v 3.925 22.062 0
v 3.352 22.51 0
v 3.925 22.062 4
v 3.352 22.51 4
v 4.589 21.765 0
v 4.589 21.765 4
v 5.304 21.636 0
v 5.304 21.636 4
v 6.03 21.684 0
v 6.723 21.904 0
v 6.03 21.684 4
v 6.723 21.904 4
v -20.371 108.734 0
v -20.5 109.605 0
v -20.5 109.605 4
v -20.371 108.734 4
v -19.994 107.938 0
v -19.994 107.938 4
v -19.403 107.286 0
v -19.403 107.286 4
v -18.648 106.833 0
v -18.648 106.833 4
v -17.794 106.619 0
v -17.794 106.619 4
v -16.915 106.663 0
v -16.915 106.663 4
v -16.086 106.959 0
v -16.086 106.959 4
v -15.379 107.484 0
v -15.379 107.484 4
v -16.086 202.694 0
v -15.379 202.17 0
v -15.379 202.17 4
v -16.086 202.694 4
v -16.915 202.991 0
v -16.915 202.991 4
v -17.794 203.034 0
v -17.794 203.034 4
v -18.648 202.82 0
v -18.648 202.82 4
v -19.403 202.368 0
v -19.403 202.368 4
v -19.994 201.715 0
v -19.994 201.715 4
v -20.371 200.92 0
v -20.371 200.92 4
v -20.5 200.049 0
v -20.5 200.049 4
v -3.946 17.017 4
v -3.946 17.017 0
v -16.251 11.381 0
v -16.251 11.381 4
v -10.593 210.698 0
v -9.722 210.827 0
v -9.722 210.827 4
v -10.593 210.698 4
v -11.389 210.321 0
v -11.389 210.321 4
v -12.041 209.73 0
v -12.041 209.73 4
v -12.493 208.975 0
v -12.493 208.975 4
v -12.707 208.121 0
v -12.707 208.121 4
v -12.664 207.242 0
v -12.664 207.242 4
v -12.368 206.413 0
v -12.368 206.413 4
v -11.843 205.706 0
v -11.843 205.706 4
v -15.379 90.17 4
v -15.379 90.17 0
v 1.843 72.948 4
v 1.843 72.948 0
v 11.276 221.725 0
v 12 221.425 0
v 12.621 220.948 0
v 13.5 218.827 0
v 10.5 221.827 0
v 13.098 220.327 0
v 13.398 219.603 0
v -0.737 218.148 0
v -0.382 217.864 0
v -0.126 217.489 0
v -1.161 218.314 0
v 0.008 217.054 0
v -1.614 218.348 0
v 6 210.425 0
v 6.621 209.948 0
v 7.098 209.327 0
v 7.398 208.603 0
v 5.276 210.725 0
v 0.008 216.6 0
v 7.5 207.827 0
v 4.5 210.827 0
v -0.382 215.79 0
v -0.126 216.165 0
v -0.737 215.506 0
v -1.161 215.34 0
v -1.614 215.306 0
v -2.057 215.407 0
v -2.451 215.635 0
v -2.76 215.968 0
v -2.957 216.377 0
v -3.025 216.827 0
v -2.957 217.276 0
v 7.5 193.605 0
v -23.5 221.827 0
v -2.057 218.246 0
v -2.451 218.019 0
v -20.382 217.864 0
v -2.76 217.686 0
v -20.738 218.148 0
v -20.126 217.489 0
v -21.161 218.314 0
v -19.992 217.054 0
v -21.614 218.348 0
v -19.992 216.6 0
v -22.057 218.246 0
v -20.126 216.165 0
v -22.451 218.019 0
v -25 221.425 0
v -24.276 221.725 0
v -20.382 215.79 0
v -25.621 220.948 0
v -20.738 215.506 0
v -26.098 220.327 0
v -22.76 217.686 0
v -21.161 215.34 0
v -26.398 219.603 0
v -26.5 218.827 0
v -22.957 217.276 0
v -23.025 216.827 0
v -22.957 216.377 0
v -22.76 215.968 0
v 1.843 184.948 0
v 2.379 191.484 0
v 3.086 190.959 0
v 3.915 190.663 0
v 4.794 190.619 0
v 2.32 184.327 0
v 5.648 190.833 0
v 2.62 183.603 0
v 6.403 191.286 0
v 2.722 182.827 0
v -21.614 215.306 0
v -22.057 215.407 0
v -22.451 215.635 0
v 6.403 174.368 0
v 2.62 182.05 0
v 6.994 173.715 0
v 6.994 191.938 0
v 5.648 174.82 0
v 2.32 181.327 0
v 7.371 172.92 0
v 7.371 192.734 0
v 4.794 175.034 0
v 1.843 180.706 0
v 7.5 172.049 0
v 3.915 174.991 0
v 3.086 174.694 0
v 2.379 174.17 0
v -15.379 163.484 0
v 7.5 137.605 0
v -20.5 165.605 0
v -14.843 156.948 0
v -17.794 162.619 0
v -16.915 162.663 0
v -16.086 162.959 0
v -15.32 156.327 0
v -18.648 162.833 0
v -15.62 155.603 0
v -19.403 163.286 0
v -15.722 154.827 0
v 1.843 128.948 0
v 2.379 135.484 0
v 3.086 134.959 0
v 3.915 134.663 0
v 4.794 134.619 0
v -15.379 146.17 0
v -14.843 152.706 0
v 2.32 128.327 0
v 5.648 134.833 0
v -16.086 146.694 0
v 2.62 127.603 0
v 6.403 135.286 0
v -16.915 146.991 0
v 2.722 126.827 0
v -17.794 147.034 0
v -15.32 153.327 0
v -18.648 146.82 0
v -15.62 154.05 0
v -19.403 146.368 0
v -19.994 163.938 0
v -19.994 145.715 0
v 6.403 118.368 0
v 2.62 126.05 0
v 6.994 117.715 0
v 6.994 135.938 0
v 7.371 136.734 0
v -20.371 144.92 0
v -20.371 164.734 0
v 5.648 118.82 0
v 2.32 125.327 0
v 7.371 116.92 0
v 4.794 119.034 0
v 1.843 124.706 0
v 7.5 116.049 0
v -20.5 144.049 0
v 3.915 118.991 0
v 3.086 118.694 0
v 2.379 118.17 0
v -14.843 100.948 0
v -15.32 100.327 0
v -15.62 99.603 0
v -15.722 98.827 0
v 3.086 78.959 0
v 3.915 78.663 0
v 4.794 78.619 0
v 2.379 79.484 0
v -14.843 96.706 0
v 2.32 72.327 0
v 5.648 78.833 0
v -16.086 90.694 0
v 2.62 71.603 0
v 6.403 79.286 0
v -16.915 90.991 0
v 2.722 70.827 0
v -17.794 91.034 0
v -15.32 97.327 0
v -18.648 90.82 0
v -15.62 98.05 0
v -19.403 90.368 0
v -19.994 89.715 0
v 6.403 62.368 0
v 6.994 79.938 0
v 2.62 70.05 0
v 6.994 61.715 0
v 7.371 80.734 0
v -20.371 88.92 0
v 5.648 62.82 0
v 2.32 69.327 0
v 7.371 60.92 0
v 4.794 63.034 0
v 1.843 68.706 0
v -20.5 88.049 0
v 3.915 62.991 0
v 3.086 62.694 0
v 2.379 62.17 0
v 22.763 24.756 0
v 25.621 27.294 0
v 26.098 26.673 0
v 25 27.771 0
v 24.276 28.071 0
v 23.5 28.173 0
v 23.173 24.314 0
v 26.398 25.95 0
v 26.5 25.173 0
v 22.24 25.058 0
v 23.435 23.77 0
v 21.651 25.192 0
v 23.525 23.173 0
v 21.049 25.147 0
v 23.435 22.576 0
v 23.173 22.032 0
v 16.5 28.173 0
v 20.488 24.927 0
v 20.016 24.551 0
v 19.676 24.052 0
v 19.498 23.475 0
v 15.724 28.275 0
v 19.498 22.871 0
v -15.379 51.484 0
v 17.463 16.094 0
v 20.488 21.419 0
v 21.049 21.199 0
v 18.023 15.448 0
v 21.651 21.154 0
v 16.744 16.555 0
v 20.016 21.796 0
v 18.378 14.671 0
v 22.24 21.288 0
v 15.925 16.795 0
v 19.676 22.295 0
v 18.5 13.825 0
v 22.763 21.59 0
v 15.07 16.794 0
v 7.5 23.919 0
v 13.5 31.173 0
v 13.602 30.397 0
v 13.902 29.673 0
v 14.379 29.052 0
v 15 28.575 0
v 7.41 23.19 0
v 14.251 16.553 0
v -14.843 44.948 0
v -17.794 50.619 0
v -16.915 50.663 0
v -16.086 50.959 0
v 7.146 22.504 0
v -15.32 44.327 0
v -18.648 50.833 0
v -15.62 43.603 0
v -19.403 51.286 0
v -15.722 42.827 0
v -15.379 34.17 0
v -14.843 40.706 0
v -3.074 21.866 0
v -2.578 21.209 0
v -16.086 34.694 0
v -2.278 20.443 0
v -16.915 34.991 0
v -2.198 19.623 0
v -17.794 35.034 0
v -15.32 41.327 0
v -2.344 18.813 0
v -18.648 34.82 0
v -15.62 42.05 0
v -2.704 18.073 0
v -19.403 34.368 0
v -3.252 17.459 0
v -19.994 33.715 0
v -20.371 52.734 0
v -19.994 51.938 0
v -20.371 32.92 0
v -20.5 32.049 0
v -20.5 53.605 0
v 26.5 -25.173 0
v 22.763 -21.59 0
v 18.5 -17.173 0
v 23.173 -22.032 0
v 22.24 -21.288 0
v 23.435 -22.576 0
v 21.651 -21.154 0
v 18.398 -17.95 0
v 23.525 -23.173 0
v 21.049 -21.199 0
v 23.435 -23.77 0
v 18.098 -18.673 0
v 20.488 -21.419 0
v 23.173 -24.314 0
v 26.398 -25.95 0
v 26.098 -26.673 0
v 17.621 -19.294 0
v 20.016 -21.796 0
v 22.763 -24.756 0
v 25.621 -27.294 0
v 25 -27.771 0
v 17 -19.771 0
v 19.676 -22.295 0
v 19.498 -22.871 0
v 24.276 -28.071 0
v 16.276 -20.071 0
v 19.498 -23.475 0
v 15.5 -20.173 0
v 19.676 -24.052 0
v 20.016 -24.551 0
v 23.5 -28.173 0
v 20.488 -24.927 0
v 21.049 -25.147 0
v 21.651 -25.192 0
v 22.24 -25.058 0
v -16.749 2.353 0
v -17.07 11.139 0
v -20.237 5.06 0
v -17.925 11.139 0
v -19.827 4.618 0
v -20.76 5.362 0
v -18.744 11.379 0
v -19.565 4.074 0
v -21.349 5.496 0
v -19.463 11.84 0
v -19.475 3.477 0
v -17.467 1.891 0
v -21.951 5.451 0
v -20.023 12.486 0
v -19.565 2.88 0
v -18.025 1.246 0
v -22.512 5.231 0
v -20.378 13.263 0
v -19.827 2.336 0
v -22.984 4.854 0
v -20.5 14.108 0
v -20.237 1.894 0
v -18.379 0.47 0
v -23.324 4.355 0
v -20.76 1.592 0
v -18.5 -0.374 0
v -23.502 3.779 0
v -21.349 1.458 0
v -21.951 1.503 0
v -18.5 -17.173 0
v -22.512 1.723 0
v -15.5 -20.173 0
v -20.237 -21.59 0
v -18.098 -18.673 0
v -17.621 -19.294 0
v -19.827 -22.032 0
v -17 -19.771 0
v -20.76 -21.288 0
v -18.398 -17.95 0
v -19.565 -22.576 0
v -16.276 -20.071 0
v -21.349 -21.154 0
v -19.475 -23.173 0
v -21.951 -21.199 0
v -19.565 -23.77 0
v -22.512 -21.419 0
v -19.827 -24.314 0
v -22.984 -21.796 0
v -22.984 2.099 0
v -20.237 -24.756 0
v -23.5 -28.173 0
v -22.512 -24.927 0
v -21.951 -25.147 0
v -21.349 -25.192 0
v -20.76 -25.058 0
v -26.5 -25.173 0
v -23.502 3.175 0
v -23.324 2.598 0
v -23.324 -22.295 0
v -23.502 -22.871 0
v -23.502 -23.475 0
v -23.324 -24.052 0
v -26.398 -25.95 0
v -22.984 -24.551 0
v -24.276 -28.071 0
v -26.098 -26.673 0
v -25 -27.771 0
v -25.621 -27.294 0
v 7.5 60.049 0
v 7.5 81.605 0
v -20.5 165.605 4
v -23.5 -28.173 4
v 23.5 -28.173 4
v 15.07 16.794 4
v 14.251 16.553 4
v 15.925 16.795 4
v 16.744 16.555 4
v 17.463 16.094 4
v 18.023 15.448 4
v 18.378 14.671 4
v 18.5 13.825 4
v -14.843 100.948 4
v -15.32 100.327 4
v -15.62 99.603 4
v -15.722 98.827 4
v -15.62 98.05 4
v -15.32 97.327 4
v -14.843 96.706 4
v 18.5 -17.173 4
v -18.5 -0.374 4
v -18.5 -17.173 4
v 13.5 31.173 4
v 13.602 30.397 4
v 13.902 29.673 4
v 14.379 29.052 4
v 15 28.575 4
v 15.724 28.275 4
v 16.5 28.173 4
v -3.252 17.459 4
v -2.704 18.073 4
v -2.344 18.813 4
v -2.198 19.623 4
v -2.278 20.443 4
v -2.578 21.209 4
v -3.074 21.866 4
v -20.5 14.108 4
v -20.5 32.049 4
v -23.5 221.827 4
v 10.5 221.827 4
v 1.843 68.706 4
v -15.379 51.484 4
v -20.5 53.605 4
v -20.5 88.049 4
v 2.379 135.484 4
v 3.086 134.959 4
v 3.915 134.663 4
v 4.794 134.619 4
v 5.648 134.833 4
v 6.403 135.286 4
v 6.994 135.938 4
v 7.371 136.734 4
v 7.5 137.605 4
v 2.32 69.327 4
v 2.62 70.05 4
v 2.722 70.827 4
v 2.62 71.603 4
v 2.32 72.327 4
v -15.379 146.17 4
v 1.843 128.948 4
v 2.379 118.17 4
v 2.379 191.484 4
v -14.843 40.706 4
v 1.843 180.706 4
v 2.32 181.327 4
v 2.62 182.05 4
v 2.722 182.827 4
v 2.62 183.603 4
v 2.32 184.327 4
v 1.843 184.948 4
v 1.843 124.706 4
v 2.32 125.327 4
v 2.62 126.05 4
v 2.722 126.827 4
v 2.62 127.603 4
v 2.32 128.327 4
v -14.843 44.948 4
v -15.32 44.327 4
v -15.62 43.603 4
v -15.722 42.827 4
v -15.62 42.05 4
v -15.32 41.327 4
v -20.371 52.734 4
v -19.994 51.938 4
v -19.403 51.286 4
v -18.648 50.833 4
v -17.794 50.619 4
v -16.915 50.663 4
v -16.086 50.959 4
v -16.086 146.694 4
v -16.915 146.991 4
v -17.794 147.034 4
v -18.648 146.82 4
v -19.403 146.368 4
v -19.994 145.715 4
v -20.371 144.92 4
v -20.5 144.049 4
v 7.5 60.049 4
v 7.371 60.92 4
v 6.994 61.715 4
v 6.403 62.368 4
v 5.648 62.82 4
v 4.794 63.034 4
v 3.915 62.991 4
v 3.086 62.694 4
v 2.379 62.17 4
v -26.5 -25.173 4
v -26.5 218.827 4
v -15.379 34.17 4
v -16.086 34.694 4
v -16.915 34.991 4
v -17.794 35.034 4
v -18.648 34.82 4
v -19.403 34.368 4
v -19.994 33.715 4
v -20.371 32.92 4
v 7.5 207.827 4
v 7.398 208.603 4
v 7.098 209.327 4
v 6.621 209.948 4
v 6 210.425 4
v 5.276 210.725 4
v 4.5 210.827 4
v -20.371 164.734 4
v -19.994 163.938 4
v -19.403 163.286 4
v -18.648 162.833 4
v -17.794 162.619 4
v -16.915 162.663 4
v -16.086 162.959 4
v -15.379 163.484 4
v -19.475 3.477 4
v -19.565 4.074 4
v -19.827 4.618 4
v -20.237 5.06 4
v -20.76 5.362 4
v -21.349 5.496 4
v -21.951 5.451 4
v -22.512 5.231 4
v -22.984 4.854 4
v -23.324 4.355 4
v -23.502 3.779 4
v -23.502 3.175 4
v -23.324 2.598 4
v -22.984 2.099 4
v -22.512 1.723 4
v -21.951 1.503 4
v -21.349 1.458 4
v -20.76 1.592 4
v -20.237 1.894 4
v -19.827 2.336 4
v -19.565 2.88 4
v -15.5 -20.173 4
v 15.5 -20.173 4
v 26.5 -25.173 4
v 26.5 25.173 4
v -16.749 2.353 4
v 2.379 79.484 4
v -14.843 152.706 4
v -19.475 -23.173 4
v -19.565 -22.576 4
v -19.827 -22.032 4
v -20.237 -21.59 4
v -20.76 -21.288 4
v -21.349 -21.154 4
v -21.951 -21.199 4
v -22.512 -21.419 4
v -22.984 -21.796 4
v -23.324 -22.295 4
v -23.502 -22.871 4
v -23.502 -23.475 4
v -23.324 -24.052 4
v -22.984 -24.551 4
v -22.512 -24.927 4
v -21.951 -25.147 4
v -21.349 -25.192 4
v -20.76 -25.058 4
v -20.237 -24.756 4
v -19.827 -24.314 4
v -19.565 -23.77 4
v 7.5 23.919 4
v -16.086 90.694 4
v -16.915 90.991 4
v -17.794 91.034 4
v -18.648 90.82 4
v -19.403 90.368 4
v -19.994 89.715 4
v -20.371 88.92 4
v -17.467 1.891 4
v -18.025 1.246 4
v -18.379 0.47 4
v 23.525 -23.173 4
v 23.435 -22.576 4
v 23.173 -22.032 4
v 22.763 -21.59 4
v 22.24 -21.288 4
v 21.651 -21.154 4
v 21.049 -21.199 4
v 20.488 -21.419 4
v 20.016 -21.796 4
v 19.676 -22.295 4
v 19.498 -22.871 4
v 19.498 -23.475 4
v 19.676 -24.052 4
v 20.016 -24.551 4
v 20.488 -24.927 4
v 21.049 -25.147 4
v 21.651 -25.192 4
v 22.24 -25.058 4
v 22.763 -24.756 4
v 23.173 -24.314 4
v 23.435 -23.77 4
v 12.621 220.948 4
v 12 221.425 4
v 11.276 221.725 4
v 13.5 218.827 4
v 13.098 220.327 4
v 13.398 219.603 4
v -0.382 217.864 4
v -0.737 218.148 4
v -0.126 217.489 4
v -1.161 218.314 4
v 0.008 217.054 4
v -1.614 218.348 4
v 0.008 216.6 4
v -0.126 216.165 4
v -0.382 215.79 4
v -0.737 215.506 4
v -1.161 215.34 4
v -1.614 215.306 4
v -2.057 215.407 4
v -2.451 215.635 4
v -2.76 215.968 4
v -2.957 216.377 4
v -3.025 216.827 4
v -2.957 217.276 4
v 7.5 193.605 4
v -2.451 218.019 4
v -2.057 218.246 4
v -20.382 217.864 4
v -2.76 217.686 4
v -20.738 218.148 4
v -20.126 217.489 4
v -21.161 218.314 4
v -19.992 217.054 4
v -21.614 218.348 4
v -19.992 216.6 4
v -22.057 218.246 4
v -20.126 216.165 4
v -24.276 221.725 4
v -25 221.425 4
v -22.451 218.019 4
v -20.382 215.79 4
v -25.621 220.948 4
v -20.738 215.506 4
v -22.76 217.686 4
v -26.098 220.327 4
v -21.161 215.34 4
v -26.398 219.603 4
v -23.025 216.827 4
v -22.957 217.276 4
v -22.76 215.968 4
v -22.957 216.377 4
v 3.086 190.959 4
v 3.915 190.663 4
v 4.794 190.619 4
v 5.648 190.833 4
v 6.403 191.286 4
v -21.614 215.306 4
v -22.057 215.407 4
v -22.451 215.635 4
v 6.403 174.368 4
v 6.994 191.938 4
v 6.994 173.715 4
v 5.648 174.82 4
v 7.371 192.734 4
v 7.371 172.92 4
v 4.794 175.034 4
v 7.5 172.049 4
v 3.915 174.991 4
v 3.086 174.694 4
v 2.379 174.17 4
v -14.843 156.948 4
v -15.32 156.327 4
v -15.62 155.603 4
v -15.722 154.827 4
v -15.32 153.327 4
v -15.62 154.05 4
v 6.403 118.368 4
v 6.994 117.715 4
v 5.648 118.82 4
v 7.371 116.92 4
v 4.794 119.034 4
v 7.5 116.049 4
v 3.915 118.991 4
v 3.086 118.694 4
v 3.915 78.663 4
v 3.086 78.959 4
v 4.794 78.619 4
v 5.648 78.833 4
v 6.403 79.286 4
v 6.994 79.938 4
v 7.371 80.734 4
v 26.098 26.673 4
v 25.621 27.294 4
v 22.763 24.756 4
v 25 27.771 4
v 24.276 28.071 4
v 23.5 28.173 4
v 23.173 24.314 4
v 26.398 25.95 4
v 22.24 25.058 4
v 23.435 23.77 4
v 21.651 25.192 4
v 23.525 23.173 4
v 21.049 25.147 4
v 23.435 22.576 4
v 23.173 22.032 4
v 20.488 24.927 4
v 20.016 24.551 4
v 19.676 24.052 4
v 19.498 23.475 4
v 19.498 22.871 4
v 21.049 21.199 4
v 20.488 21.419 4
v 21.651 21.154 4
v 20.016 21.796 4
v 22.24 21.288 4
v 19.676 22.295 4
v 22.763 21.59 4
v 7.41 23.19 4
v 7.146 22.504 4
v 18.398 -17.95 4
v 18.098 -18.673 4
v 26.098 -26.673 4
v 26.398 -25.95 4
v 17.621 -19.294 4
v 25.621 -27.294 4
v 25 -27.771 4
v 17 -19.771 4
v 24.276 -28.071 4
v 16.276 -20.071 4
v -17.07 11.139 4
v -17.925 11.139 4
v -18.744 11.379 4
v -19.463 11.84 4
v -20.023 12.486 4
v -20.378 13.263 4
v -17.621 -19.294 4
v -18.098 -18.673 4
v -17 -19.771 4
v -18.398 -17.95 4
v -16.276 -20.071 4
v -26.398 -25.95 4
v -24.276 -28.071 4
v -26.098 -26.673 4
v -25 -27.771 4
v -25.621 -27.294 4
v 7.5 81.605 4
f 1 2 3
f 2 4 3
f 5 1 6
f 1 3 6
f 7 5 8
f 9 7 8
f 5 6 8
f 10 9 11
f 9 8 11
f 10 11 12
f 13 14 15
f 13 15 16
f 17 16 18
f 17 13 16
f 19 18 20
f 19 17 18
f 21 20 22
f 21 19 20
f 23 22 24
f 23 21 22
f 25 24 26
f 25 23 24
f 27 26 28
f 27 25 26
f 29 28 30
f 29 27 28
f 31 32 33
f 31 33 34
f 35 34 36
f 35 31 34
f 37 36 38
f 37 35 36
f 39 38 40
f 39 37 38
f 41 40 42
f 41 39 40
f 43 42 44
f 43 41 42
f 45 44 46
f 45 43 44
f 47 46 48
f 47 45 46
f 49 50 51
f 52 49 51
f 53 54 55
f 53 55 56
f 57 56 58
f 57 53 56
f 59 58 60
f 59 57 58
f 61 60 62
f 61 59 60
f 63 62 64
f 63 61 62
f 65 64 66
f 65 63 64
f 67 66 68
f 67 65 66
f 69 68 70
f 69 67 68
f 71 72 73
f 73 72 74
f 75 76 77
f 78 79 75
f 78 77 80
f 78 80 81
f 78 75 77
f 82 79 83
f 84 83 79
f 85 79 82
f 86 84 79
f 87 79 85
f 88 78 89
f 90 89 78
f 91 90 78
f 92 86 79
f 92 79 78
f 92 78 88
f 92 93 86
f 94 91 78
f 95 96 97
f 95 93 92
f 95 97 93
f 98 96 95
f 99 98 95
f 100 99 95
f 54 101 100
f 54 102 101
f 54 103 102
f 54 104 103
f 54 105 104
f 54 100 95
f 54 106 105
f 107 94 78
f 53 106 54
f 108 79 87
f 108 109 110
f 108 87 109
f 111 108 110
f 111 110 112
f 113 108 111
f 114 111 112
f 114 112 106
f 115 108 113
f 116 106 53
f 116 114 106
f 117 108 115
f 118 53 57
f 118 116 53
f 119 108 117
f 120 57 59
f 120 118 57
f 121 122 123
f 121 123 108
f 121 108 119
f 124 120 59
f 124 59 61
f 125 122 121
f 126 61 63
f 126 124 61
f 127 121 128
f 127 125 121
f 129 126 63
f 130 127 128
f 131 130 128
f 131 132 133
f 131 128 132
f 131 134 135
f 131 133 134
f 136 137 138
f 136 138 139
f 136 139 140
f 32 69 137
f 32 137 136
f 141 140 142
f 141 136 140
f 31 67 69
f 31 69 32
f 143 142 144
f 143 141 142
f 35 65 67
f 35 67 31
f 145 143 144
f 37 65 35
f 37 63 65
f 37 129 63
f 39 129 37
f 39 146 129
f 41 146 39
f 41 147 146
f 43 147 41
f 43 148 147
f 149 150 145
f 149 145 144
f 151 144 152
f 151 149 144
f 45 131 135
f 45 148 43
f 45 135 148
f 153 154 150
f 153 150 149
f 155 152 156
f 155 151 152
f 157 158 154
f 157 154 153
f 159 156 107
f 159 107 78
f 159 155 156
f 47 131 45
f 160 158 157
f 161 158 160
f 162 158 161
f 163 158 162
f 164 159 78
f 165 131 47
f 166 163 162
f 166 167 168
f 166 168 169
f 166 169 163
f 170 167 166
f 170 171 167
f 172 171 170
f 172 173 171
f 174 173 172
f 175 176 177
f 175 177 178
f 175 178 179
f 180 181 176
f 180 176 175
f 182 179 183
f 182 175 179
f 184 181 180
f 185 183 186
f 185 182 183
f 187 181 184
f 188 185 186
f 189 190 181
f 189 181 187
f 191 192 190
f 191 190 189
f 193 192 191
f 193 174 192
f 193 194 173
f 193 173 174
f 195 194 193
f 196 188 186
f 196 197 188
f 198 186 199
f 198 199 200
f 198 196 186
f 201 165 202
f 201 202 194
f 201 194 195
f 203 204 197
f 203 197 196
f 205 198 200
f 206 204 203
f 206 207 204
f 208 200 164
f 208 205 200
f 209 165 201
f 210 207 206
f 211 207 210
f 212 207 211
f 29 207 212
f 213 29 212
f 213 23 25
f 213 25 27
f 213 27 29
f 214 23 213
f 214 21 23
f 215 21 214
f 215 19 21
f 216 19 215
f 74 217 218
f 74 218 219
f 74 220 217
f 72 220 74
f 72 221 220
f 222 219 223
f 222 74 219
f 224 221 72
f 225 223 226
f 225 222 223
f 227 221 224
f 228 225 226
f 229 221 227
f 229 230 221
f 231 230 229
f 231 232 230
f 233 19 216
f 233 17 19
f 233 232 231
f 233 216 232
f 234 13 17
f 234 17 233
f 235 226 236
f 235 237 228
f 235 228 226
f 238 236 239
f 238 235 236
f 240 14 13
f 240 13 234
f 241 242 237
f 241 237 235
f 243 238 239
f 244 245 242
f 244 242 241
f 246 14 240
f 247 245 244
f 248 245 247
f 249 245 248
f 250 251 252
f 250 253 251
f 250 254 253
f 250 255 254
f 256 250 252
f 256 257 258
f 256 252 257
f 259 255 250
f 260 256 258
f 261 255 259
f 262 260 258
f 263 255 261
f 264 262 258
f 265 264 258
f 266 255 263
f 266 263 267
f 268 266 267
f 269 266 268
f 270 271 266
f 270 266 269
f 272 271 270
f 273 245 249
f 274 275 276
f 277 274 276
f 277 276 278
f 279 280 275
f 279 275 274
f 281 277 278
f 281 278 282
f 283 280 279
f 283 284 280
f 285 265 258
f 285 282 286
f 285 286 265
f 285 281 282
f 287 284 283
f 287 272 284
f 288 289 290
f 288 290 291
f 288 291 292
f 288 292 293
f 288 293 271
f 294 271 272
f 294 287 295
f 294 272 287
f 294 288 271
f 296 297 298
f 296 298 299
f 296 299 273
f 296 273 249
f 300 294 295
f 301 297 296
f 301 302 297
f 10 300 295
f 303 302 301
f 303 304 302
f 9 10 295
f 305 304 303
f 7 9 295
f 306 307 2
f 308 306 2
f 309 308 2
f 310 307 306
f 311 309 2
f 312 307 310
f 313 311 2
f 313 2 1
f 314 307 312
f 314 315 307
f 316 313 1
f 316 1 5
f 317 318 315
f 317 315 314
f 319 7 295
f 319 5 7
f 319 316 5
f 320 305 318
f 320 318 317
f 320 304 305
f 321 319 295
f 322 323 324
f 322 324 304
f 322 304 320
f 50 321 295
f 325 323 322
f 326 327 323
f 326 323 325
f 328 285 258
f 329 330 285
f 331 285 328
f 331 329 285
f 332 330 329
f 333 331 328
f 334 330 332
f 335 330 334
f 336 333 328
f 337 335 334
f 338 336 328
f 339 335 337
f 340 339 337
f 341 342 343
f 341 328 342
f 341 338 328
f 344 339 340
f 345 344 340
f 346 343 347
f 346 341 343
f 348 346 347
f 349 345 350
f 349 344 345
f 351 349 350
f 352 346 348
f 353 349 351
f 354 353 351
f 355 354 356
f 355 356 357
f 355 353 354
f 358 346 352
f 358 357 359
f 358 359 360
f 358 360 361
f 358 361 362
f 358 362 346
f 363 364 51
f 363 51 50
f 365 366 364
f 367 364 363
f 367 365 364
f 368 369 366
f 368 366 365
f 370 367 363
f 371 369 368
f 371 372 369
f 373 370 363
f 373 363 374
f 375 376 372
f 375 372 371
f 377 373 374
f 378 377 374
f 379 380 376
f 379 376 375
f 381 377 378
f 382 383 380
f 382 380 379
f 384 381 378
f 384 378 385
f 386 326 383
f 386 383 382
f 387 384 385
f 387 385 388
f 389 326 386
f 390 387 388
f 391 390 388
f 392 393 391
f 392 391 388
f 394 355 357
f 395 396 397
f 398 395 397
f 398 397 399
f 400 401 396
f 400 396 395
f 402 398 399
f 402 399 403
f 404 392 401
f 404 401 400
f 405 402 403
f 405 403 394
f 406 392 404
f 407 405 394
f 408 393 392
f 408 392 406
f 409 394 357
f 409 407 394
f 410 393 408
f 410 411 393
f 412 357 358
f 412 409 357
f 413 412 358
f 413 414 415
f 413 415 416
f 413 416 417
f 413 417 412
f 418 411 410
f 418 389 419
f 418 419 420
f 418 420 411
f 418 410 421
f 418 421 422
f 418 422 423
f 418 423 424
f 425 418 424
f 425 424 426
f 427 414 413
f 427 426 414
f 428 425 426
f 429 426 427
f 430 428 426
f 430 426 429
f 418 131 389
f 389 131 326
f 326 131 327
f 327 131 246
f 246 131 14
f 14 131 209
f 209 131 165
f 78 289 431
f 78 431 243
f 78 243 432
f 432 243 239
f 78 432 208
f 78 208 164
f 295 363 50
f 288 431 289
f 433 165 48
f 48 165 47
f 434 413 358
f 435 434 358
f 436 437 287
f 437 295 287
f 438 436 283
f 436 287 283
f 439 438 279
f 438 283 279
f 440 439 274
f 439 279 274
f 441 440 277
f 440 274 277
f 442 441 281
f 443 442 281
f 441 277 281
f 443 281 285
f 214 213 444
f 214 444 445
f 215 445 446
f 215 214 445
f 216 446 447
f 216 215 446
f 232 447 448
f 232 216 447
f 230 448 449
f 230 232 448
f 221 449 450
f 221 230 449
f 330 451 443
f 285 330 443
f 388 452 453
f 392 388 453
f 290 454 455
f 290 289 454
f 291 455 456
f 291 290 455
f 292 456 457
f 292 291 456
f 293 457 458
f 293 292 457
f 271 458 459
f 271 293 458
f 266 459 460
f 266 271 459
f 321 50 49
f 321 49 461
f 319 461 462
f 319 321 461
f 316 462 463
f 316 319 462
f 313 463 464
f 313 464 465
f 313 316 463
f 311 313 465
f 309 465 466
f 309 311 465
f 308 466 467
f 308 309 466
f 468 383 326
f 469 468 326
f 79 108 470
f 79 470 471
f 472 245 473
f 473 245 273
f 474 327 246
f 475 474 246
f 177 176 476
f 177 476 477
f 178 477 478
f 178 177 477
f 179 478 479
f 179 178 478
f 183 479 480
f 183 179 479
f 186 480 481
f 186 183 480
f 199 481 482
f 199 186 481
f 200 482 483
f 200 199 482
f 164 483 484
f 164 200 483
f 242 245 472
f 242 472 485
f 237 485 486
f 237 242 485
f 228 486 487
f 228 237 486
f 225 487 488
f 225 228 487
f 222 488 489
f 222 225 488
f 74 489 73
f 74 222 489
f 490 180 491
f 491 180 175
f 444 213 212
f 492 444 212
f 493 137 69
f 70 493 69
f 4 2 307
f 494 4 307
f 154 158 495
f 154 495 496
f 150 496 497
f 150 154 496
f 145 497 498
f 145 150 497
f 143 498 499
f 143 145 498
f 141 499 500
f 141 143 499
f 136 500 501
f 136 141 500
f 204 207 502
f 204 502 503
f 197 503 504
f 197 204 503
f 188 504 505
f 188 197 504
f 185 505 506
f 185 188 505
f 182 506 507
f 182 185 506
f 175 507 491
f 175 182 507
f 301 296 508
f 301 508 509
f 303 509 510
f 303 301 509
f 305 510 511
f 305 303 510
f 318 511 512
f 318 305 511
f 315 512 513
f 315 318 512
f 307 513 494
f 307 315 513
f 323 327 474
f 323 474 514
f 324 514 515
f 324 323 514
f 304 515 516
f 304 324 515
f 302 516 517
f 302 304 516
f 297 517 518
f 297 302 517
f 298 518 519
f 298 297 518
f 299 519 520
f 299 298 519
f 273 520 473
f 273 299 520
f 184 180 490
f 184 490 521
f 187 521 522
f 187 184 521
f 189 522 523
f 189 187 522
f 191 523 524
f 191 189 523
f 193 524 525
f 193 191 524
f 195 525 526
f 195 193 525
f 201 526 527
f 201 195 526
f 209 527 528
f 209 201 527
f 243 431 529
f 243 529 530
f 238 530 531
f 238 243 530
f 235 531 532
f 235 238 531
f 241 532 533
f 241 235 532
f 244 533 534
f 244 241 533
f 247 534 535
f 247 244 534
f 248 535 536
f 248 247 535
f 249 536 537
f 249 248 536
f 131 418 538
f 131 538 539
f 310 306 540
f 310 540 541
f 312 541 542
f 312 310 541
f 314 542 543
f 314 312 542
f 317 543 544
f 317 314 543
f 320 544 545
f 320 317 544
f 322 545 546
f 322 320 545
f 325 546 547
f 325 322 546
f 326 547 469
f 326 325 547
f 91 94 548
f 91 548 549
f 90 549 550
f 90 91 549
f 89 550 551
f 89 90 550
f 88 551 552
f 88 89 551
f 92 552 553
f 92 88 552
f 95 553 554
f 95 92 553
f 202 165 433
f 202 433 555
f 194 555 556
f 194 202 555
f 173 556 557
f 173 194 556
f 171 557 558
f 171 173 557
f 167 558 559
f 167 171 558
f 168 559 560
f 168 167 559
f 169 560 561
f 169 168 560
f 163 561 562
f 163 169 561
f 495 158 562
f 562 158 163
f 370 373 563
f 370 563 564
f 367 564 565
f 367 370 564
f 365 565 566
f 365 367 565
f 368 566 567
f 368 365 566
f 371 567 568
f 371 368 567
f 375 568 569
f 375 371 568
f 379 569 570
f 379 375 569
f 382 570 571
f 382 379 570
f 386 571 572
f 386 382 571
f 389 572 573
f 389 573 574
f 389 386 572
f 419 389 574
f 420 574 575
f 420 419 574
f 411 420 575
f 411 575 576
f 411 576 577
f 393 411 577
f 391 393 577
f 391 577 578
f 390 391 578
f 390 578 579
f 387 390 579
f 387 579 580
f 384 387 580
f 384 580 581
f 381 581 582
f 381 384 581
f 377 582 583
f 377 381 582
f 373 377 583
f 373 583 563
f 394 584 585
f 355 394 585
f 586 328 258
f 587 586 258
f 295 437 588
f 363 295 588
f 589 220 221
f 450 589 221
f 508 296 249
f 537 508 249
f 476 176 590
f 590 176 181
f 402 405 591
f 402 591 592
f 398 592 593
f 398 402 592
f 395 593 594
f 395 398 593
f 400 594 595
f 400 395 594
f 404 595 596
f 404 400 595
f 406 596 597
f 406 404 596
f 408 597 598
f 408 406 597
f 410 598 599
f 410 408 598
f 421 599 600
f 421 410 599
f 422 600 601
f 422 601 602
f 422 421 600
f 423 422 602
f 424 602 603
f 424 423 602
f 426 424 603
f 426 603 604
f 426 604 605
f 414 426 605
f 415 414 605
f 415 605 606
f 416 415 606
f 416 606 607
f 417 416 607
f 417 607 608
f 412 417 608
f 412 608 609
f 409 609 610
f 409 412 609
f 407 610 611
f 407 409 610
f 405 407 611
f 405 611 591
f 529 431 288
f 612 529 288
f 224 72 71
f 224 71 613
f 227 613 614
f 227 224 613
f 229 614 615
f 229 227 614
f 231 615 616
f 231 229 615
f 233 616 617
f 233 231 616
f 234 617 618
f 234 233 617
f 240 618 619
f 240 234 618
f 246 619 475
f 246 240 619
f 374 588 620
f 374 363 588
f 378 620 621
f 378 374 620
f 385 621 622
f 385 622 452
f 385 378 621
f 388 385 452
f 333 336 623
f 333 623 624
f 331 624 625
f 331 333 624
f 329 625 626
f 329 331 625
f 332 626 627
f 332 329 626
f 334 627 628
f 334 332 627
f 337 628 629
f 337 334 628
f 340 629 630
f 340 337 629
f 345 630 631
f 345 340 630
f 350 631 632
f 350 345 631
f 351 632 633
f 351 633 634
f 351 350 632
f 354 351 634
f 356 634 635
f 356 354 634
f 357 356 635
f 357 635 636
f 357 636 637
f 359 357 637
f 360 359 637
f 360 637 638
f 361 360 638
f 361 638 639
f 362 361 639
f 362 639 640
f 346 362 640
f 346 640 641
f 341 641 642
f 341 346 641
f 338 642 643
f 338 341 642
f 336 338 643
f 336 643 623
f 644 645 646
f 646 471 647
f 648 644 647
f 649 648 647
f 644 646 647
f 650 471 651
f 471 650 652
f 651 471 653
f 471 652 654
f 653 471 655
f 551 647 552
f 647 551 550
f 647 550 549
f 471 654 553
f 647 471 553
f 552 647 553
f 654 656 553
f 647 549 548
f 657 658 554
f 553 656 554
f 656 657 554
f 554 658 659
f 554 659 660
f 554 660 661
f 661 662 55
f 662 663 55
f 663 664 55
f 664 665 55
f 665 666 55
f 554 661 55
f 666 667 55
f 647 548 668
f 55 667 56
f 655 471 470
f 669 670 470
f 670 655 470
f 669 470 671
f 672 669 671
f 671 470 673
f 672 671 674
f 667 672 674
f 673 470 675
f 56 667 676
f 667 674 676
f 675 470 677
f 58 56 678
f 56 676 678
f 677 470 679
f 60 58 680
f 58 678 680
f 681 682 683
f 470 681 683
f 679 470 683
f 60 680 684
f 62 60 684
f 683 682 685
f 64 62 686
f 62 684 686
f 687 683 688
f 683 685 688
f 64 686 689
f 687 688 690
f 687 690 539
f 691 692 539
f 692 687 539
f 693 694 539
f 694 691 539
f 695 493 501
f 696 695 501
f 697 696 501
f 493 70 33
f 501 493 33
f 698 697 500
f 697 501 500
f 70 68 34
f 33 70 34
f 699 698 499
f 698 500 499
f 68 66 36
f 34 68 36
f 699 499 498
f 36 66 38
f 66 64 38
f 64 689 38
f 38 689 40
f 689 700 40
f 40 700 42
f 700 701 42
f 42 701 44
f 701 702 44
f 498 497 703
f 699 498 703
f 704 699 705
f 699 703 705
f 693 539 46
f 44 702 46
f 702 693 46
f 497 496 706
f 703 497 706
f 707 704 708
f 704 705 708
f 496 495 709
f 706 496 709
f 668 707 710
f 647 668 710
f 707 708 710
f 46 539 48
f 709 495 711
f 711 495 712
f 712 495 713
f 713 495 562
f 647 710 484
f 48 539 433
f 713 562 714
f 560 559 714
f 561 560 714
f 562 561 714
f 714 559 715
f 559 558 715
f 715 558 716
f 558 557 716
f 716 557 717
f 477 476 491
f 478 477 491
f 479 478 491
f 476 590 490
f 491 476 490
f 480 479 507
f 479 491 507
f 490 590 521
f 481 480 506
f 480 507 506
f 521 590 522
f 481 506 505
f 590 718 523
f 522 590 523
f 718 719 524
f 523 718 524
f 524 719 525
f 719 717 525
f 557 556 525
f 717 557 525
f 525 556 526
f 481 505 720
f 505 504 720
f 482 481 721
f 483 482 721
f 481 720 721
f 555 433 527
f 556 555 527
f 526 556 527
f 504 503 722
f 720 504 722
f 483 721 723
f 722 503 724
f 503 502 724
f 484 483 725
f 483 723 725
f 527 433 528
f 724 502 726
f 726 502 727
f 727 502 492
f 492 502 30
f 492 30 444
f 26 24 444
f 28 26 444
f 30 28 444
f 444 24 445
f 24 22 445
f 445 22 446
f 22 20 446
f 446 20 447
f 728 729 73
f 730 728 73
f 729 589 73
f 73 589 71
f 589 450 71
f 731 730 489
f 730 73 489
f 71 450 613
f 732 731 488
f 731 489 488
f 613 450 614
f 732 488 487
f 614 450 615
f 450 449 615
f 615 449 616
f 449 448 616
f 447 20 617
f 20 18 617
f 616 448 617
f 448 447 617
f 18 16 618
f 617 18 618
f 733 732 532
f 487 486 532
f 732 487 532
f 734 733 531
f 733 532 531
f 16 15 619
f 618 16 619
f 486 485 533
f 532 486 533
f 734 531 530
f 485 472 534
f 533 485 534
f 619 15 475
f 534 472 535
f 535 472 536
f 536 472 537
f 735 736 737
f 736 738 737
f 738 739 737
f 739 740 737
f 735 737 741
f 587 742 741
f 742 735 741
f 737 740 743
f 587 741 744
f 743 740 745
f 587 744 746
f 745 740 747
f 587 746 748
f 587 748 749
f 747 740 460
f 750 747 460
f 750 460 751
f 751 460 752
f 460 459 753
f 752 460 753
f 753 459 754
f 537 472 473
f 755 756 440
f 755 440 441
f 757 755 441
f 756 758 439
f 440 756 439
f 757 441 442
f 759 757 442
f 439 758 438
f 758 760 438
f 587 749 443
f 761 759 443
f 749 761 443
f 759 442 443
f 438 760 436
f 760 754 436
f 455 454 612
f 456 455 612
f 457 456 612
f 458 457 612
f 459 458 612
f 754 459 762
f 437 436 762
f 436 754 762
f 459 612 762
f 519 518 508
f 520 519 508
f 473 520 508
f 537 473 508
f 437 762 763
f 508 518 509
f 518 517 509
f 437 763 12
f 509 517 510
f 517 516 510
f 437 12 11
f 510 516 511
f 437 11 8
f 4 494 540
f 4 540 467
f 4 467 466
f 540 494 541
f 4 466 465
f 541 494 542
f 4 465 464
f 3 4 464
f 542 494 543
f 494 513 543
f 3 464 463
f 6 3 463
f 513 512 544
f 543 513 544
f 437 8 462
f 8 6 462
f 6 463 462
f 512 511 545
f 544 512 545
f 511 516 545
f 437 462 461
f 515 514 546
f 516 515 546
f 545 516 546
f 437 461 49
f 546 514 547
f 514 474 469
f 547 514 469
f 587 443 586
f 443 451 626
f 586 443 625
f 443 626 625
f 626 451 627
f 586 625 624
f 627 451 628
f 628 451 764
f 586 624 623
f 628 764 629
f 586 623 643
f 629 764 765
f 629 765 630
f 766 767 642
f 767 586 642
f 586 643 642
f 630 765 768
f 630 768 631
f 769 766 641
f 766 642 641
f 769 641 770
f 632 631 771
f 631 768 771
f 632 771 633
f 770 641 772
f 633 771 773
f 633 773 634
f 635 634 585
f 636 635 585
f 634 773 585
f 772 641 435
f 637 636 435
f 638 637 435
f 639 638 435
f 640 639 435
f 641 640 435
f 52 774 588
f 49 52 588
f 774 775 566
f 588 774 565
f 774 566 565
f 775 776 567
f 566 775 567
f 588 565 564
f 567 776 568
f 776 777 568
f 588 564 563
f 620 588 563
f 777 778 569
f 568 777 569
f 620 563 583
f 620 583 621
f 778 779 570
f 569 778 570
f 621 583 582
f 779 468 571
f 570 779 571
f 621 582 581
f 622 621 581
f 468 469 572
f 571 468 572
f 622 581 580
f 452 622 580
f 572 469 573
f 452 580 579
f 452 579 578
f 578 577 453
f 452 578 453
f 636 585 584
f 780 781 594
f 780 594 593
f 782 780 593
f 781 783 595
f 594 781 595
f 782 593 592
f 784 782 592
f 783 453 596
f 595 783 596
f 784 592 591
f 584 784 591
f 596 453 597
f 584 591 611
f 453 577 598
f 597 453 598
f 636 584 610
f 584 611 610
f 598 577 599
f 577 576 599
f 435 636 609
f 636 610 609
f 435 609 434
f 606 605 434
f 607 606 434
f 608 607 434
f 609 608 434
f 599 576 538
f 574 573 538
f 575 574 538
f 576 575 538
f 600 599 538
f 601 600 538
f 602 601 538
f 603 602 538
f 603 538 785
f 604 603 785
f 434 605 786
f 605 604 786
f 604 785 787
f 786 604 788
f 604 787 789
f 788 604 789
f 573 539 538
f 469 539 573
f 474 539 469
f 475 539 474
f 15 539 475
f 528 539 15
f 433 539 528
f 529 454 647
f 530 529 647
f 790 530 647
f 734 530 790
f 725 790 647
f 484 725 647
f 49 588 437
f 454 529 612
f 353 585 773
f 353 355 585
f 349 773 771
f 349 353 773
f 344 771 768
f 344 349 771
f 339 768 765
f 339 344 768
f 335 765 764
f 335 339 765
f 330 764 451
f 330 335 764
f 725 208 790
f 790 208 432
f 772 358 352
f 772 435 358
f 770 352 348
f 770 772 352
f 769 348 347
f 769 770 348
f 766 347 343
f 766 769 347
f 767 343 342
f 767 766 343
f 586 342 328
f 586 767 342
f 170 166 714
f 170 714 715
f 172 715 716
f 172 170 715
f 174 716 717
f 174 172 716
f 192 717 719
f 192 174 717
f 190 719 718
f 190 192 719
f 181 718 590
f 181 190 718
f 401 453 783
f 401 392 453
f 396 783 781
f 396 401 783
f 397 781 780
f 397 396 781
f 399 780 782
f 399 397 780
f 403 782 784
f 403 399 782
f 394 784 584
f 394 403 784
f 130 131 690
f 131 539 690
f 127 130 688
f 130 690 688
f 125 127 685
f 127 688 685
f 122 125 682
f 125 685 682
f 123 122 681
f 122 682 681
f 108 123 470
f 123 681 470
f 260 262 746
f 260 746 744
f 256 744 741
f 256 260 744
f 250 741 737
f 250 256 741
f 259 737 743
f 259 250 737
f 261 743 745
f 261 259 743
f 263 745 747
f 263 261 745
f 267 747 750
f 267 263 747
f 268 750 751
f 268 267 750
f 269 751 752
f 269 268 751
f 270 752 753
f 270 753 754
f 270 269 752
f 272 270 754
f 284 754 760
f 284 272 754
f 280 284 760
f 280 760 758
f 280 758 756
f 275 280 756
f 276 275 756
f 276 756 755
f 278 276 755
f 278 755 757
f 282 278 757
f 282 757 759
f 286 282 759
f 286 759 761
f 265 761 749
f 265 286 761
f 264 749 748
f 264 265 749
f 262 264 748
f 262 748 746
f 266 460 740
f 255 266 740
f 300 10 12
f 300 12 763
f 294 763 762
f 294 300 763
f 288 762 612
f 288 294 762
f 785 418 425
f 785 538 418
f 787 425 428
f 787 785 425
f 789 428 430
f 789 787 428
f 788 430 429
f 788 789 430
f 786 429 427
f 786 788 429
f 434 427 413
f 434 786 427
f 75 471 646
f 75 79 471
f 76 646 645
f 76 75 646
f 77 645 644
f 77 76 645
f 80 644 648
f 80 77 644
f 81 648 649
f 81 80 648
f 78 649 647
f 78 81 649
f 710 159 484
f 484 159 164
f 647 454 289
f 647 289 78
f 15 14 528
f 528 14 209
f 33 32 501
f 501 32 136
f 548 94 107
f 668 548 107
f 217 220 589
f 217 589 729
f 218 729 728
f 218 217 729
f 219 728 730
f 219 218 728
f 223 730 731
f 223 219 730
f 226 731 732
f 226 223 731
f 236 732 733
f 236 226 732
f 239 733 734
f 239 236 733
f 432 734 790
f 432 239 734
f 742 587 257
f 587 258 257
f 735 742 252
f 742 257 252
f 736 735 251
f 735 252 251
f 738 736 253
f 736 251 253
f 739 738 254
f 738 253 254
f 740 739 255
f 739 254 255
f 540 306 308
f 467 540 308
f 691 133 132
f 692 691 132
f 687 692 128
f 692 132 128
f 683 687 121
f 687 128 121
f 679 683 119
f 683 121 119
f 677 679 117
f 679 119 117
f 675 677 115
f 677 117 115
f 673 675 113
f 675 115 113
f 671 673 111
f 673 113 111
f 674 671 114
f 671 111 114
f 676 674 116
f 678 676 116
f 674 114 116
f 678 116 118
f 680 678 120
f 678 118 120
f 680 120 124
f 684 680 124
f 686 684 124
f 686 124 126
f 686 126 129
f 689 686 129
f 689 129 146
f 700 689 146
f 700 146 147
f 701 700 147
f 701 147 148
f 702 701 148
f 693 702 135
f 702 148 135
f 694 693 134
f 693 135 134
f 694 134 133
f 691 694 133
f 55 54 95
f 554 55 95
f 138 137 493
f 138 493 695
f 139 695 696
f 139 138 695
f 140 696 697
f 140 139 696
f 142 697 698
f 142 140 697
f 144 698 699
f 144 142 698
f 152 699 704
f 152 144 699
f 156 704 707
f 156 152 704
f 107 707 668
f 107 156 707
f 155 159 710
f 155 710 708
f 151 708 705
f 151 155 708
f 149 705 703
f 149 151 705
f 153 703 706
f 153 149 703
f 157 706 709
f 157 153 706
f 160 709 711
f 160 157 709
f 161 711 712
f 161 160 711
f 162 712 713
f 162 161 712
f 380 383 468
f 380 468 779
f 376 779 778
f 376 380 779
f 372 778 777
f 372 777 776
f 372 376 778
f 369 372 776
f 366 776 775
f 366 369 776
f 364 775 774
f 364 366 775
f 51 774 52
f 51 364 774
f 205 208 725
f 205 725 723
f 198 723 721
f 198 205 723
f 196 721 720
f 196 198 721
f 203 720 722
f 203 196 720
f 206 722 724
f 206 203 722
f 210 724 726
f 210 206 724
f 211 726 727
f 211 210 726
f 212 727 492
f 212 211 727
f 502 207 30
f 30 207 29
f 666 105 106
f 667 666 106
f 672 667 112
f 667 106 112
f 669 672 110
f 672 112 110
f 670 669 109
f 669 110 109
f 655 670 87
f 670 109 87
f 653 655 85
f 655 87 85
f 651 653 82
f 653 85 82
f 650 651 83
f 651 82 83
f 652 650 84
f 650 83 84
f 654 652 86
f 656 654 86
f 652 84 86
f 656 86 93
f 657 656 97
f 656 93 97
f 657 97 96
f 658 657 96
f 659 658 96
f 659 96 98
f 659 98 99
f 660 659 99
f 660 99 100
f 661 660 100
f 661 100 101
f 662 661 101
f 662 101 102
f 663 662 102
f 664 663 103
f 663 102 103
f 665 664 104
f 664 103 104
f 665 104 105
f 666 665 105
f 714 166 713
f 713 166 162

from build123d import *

# Parameters (mm, degrees)
SKETCH_1_W          = 53
SKETCH_1_H          = 250
SKETCH_1_R          = 2.025
EXTRUDE_1_DEPTH     = 4
SKETCH_2_W          = 13
SKETCH_2_H          = 193.6536947
CUT_EXTRUDE_1_DEPTH = 4
SKETCH_6_R          = 1.525
CUT_EXTRUDE_3_DEPTH = 4
FILLET_1_R          = 3
CUT_EXTRUDE_4_DEPTH = 4
FILLET_2_R          = 3
CUT_EXTRUDE_5_DEPTH = 4
FILLET_3_R          = 3
FILLET_4_R          = 3


with BuildPart() as part:
    # 草图1 → 凸台-拉伸1 (new body)
    with BuildSketch(Plane.XY):
        with Locations((0, 96.82684735)):
            Rectangle(SKETCH_1_W, SKETCH_1_H)
        with Locations((21.5, 23.17315265)):
            Circle(SKETCH_1_R, mode=Mode.SUBTRACT)
        with Locations((21.5, -23.17315265)):
            Circle(SKETCH_1_R, mode=Mode.SUBTRACT)
        with Locations((-21.5, -23.17315265)):
            Circle(SKETCH_1_R, mode=Mode.SUBTRACT)
        with Locations((-21.5, 3.47684735)):
            Circle(SKETCH_1_R, mode=Mode.SUBTRACT)
    extrude(amount=EXTRUDE_1_DEPTH)

    # 草图2 → 切除-拉伸1 (cut)
    with BuildSketch(Plane.XY.offset(4)):
        with Locations((20, 125)):
            Rectangle(SKETCH_2_W, SKETCH_2_H)
    extrude(amount=-CUT_EXTRUDE_1_DEPTH, mode=Mode.SUBTRACT)

    # 草图6 → 切除-拉伸3 (cut)
    with BuildSketch(Plane(origin=(0, 0, 0), x_dir=(-1, 0, 0), z_dir=(0, 0, -1))):
        with Locations((21.5, 216.82684735)):
            Circle(SKETCH_6_R)
        with Locations((1.5, 216.82684735)):
            Circle(SKETCH_6_R)
    extrude(amount=-CUT_EXTRUDE_3_DEPTH, mode=Mode.SUBTRACT)

    # 圆角1
    fillet_1_edges = [part.edges().sort_by_distance(p)[0] for p in [
        (13.5, 221.82684735, 2),
        (26.5, 28.17315265, 2),
        (13.5, 28.17315265, 2),
        (-26.5, 221.82684735, 2),
        (26.5, -28.17315265, 2),
        (-26.5, -28.17315265, 2),
    ]]
    fillet(fillet_1_edges, radius=FILLET_1_R)

    # 草图7 → 切除-拉伸4 (cut)
    with BuildSketch(Plane.XY.offset(4)):
        Polygon((18.5, 18.499246673), (-18.5, 1.551263043), (-18.5, -20.17315265), (18.5, -20.17315265), align=None)
    extrude(amount=-CUT_EXTRUDE_4_DEPTH, mode=Mode.SUBTRACT)

    # 圆角2
    fillet_2_edges = [part.edges().sort_by_distance(p)[0] for p in [
        (18.5, 18.499246673, 2),
        (18.5, -20.17315265, 2),
        (-18.5, -20.17315265, 2),
        (-18.5, 1.551263043, 2),
    ]]
    fillet(fillet_2_edges, radius=FILLET_2_R)

    # 草图8 → 切除-拉伸5 (cut)
    with BuildSketch(Plane(origin=(0, 0, 0), x_dir=(-1, 0, 0), z_dir=(0, 0, -1))):
        Polygon((20.5, 39.291313444), (0.022812462, 18.814125906), (20.5, 9.434476198), align=None)
        Polygon((16.964466094, 42.82684735), (-7.5, 67.291313444), (-7.5, 22.259977323), (-4.826849962, 21.035531294), align=None)
        Polygon((20.5, 46.362381256), (20.5, 95.291313444), (-3.964466094, 70.82684735), align=None)
        Polygon((16.964466094, 98.82684735), (-7.5, 123.291313444), (-7.5, 74.362381256), align=None)
        Polygon((20.5, 102.362381256), (20.5, 151.291313444), (-3.964466094, 126.82684735), align=None)
        Polygon((16.964466094, 154.82684735), (-7.5, 179.291313444), (-7.5, 130.362381256), align=None)
        Polygon((20.5, 158.362381256), (20.5, 207.291313444), (-3.964466094, 182.82684735), align=None)
        Polygon((16.964466094, 210.82684735), (-7.5, 210.82684735), (-7.5, 186.362381256), align=None)
    extrude(amount=-CUT_EXTRUDE_5_DEPTH, mode=Mode.SUBTRACT)

    # 圆角3
    fillet_3_edges = [part.edges().sort_by_distance(p)[0] for p in [
        (4.826849962, 21.035531294, 2),
    ]]
    fillet(fillet_3_edges, radius=FILLET_3_R)

    # 圆角4
    # the kernel refuses this fillet: 3 mm, written as the material it adds along each edge
    with BuildSketch(Plane(origin=(-16.964466094, 98.82684735, 0), x_dir=(0.707106781186547, 0.7071067811865482, 0), z_dir=(0, 0, 1)), Plane(origin=(3.964466094, 126.82684735, 0), x_dir=(-0.7071067811865479, -0.707106781186547, 0), z_dir=(0, 0, 1)), Plane(origin=(7.5, 210.82684735, 0), x_dir=(0, -1, 0), z_dir=(0, 0, 1)), Plane(origin=(-16.964466094, 154.82684735, 0), x_dir=(0.7071067811865442, 0.7071067811865508, 0), z_dir=(0, 0, 1)), Plane(origin=(3.964466094, 182.82684735, 0), x_dir=(-0.7071067811865441, -0.7071067811865508, 0), z_dir=(0, 0, 1))) as fillet_4_piece_1:
        with BuildLine():
            CenterArc((FILLET_4_R, -FILLET_4_R), FILLET_4_R, 90, 90)
            Line((0, -FILLET_4_R), (-FILLET_4_R * 0.02, -FILLET_4_R))
            Line((-FILLET_4_R * 0.02, -FILLET_4_R), (-FILLET_4_R * 0.02, FILLET_4_R * 0.02))
            Line((-FILLET_4_R * 0.02, FILLET_4_R * 0.02), (FILLET_4_R, FILLET_4_R * 0.02))
            Line((FILLET_4_R, FILLET_4_R * 0.02), (FILLET_4_R, 0))
        make_face()
    extrude(amount=4)
    with BuildSketch(Plane(origin=(7.5, 74.362381256, 0), x_dir=(0, 1, 0), z_dir=(0, 0, 1)), Plane(origin=(-20.5, 102.362381256, 0), x_dir=(0.7071067811865476, 0.7071067811865476, 0), z_dir=(0, 0, 1)), Plane(origin=(7.5, 67.291313444, 0), x_dir=(-0.7071067811865478, -0.7071067811865471, 0), z_dir=(0, 0, 1)), Plane(origin=(-16.964466094, 210.82684735, 0), x_dir=(0.7071067811865466, -0.7071067811865486, 0), z_dir=(0, 0, 1)), Plane(origin=(7.5, 130.362381256, 0), x_dir=(0, 1, 0), z_dir=(0, 0, 1)), Plane(origin=(-20.5, 158.362381256, 0), x_dir=(0.707106781186543, 0.707106781186552, 0), z_dir=(0, 0, 1)), Plane(origin=(-20.5, 39.291313444, 0), x_dir=(0, -1, 0), z_dir=(0, 0, 1))) as fillet_4_piece_2:
        with BuildLine():
            CenterArc((FILLET_4_R * 2.41421356237, FILLET_4_R), FILLET_4_R, 135, 135)
            Line((FILLET_4_R * 1.70710678119, FILLET_4_R * 1.70710678119), (FILLET_4_R * 1.69296464556, FILLET_4_R * 1.72124891681))
            Line((FILLET_4_R * 1.69296464556, FILLET_4_R * 1.72124891681), (-FILLET_4_R * 0.0141421356237, FILLET_4_R * 0.0141421356237))
            Line((-FILLET_4_R * 0.0141421356237, FILLET_4_R * 0.0141421356237), (0, -FILLET_4_R * 0.02))
            Line((0, -FILLET_4_R * 0.02), (FILLET_4_R * 2.41421356237, -FILLET_4_R * 0.02))
            Line((FILLET_4_R * 2.41421356237, -FILLET_4_R * 0.02), (FILLET_4_R * 2.41421356237, 0))
        make_face()
    extrude(amount=4)
    with BuildSketch(Plane(origin=(7.5, 123.291313444, 0), x_dir=(0, -1, 0), z_dir=(0, 0, 1)), Plane(origin=(-20.5, 151.291313444, 0), x_dir=(0.707106781186547, -0.707106781186548, 0), z_dir=(0, 0, 1)), Plane(origin=(-20.5, 46.362381256, 0), x_dir=(0, 1, 0), z_dir=(0, 0, 1)), Plane(origin=(-20.5, 95.291313444, 0), x_dir=(0.7071067811865476, -0.7071067811865476, 0), z_dir=(0, 0, 1)), Plane(origin=(7.5, 186.362381256, 0), x_dir=(-0.7071067811865478, 0.7071067811865474, 0), z_dir=(0, 0, 1)), Plane(origin=(7.5, 179.291313444, 0), x_dir=(0, -1, 0), z_dir=(0, 0, 1)), Plane(origin=(-20.5, 207.291313444, 0), x_dir=(0.7071067811865468, -0.7071067811865482, 0), z_dir=(0, 0, 1))) as fillet_4_piece_3:
        with BuildLine():
            CenterArc((FILLET_4_R * 2.41421356237, -FILLET_4_R), FILLET_4_R, 90, 135)
            Line((FILLET_4_R * 1.70710678119, -FILLET_4_R * 1.70710678119), (FILLET_4_R * 1.69296464556, -FILLET_4_R * 1.72124891681))
            Line((FILLET_4_R * 1.69296464556, -FILLET_4_R * 1.72124891681), (-FILLET_4_R * 0.0141421356237, -FILLET_4_R * 0.0141421356237))
            Line((-FILLET_4_R * 0.0141421356237, -FILLET_4_R * 0.0141421356237), (0, FILLET_4_R * 0.02))
            Line((0, FILLET_4_R * 0.02), (FILLET_4_R * 2.41421356237, FILLET_4_R * 0.02))
            Line((FILLET_4_R * 2.41421356237, FILLET_4_R * 0.02), (FILLET_4_R * 2.41421356237, 0))
        make_face()
    extrude(amount=4)
    with BuildSketch(Plane(origin=(-16.964466094, 42.82684735, 0), x_dir=(0.7071067811865487, -0.7071067811865464, 0), z_dir=(0, 0, 1)), Plane(origin=(3.964466094, 70.82684735, 0), x_dir=(-0.707106781186549, 0.707106781186546, 0), z_dir=(0, 0, 1))) as fillet_4_piece_4:
        with BuildLine():
            CenterArc((FILLET_4_R, FILLET_4_R), FILLET_4_R, 180, 90)
            Line((0, FILLET_4_R), (-FILLET_4_R * 0.02, FILLET_4_R))
            Line((-FILLET_4_R * 0.02, FILLET_4_R), (-FILLET_4_R * 0.02, -FILLET_4_R * 0.02))
            Line((-FILLET_4_R * 0.02, -FILLET_4_R * 0.02), (FILLET_4_R, -FILLET_4_R * 0.02))
            Line((FILLET_4_R, -FILLET_4_R * 0.02), (FILLET_4_R, 0))
        make_face()
    extrude(amount=4)
    with BuildSketch(Plane(origin=(7.5, 22.259977323, 0), x_dir=(-0.9091611234166711, -0.4164445361242436, 0), z_dir=(0, 0, 1))) as fillet_4_piece_5:
        with BuildLine():
            CenterArc((2.03672897, -2.757354466), FILLET_4_R, 113.202499131, 42.187182076)
            Line((-0.6907544, -1.508020858), (-0.745304068, -1.483034186))
            Line((-0.745304068, -1.483034186), (-0.054549667, 0.024986672))
            Line((-0.054549667, 0.024986672), (0, 0.06))
            ThreePointArc((0, 0.06), (0.427391485, 0.06), (0.83114405, 0.055147089))
            Line((0.83114405, 0.055147089), (0.85478297, 0))
        make_face()
    extrude(amount=4)
    with BuildSketch(Plane(origin=(-0.022812462, 18.814125906, 0), x_dir=(-0.9091611234134724, -0.4164445361312268, 0), z_dir=(0, 0, 1))) as fillet_4_piece_6:
        with BuildLine():
            CenterArc((FILLET_4_R * 1.43853500921, -FILLET_4_R), FILLET_4_R, 90, 110.389681207)
            Line((FILLET_4_R * 0.501190258162, -FILLET_4_R * 1.34840324007), (FILLET_4_R * 0.482443363141, -FILLET_4_R * 1.35537130487))
            Line((FILLET_4_R * 0.482443363141, -FILLET_4_R * 1.35537130487), (-FILLET_4_R * 0.0287707001841, FILLET_4_R * 0.02))
            Line((-FILLET_4_R * 0.0287707001841, FILLET_4_R * 0.02), (FILLET_4_R * 1.43853500921, FILLET_4_R * 0.02))
            Line((FILLET_4_R * 1.43853500921, FILLET_4_R * 0.02), (FILLET_4_R * 1.43853500921, 0))
        make_face()
    extrude(amount=4)
    with BuildSketch(Plane(origin=(-20.5, 9.434476198, 0), x_dir=(0, 1, 0), z_dir=(0, 0, 1))) as fillet_4_piece_7:
        with BuildLine():
            CenterArc((FILLET_4_R * 1.55796865886, -FILLET_4_R), FILLET_4_R, 90, 114.610318793)
            Line((FILLET_4_R * 0.648807535446, -FILLET_4_R * 1.41644453613), (FILLET_4_R * 0.630624312977, -FILLET_4_R * 1.42477342685))
            Line((FILLET_4_R * 0.630624312977, -FILLET_4_R * 1.42477342685), (-FILLET_4_R * 0.0311593731772, FILLET_4_R * 0.02))
            Line((-FILLET_4_R * 0.0311593731772, FILLET_4_R * 0.02), (FILLET_4_R * 1.55796865886, FILLET_4_R * 0.02))
            Line((FILLET_4_R * 1.55796865886, FILLET_4_R * 0.02), (FILLET_4_R * 1.55796865886, 0))
        make_face()
    extrude(amount=4)


solid = part.part
